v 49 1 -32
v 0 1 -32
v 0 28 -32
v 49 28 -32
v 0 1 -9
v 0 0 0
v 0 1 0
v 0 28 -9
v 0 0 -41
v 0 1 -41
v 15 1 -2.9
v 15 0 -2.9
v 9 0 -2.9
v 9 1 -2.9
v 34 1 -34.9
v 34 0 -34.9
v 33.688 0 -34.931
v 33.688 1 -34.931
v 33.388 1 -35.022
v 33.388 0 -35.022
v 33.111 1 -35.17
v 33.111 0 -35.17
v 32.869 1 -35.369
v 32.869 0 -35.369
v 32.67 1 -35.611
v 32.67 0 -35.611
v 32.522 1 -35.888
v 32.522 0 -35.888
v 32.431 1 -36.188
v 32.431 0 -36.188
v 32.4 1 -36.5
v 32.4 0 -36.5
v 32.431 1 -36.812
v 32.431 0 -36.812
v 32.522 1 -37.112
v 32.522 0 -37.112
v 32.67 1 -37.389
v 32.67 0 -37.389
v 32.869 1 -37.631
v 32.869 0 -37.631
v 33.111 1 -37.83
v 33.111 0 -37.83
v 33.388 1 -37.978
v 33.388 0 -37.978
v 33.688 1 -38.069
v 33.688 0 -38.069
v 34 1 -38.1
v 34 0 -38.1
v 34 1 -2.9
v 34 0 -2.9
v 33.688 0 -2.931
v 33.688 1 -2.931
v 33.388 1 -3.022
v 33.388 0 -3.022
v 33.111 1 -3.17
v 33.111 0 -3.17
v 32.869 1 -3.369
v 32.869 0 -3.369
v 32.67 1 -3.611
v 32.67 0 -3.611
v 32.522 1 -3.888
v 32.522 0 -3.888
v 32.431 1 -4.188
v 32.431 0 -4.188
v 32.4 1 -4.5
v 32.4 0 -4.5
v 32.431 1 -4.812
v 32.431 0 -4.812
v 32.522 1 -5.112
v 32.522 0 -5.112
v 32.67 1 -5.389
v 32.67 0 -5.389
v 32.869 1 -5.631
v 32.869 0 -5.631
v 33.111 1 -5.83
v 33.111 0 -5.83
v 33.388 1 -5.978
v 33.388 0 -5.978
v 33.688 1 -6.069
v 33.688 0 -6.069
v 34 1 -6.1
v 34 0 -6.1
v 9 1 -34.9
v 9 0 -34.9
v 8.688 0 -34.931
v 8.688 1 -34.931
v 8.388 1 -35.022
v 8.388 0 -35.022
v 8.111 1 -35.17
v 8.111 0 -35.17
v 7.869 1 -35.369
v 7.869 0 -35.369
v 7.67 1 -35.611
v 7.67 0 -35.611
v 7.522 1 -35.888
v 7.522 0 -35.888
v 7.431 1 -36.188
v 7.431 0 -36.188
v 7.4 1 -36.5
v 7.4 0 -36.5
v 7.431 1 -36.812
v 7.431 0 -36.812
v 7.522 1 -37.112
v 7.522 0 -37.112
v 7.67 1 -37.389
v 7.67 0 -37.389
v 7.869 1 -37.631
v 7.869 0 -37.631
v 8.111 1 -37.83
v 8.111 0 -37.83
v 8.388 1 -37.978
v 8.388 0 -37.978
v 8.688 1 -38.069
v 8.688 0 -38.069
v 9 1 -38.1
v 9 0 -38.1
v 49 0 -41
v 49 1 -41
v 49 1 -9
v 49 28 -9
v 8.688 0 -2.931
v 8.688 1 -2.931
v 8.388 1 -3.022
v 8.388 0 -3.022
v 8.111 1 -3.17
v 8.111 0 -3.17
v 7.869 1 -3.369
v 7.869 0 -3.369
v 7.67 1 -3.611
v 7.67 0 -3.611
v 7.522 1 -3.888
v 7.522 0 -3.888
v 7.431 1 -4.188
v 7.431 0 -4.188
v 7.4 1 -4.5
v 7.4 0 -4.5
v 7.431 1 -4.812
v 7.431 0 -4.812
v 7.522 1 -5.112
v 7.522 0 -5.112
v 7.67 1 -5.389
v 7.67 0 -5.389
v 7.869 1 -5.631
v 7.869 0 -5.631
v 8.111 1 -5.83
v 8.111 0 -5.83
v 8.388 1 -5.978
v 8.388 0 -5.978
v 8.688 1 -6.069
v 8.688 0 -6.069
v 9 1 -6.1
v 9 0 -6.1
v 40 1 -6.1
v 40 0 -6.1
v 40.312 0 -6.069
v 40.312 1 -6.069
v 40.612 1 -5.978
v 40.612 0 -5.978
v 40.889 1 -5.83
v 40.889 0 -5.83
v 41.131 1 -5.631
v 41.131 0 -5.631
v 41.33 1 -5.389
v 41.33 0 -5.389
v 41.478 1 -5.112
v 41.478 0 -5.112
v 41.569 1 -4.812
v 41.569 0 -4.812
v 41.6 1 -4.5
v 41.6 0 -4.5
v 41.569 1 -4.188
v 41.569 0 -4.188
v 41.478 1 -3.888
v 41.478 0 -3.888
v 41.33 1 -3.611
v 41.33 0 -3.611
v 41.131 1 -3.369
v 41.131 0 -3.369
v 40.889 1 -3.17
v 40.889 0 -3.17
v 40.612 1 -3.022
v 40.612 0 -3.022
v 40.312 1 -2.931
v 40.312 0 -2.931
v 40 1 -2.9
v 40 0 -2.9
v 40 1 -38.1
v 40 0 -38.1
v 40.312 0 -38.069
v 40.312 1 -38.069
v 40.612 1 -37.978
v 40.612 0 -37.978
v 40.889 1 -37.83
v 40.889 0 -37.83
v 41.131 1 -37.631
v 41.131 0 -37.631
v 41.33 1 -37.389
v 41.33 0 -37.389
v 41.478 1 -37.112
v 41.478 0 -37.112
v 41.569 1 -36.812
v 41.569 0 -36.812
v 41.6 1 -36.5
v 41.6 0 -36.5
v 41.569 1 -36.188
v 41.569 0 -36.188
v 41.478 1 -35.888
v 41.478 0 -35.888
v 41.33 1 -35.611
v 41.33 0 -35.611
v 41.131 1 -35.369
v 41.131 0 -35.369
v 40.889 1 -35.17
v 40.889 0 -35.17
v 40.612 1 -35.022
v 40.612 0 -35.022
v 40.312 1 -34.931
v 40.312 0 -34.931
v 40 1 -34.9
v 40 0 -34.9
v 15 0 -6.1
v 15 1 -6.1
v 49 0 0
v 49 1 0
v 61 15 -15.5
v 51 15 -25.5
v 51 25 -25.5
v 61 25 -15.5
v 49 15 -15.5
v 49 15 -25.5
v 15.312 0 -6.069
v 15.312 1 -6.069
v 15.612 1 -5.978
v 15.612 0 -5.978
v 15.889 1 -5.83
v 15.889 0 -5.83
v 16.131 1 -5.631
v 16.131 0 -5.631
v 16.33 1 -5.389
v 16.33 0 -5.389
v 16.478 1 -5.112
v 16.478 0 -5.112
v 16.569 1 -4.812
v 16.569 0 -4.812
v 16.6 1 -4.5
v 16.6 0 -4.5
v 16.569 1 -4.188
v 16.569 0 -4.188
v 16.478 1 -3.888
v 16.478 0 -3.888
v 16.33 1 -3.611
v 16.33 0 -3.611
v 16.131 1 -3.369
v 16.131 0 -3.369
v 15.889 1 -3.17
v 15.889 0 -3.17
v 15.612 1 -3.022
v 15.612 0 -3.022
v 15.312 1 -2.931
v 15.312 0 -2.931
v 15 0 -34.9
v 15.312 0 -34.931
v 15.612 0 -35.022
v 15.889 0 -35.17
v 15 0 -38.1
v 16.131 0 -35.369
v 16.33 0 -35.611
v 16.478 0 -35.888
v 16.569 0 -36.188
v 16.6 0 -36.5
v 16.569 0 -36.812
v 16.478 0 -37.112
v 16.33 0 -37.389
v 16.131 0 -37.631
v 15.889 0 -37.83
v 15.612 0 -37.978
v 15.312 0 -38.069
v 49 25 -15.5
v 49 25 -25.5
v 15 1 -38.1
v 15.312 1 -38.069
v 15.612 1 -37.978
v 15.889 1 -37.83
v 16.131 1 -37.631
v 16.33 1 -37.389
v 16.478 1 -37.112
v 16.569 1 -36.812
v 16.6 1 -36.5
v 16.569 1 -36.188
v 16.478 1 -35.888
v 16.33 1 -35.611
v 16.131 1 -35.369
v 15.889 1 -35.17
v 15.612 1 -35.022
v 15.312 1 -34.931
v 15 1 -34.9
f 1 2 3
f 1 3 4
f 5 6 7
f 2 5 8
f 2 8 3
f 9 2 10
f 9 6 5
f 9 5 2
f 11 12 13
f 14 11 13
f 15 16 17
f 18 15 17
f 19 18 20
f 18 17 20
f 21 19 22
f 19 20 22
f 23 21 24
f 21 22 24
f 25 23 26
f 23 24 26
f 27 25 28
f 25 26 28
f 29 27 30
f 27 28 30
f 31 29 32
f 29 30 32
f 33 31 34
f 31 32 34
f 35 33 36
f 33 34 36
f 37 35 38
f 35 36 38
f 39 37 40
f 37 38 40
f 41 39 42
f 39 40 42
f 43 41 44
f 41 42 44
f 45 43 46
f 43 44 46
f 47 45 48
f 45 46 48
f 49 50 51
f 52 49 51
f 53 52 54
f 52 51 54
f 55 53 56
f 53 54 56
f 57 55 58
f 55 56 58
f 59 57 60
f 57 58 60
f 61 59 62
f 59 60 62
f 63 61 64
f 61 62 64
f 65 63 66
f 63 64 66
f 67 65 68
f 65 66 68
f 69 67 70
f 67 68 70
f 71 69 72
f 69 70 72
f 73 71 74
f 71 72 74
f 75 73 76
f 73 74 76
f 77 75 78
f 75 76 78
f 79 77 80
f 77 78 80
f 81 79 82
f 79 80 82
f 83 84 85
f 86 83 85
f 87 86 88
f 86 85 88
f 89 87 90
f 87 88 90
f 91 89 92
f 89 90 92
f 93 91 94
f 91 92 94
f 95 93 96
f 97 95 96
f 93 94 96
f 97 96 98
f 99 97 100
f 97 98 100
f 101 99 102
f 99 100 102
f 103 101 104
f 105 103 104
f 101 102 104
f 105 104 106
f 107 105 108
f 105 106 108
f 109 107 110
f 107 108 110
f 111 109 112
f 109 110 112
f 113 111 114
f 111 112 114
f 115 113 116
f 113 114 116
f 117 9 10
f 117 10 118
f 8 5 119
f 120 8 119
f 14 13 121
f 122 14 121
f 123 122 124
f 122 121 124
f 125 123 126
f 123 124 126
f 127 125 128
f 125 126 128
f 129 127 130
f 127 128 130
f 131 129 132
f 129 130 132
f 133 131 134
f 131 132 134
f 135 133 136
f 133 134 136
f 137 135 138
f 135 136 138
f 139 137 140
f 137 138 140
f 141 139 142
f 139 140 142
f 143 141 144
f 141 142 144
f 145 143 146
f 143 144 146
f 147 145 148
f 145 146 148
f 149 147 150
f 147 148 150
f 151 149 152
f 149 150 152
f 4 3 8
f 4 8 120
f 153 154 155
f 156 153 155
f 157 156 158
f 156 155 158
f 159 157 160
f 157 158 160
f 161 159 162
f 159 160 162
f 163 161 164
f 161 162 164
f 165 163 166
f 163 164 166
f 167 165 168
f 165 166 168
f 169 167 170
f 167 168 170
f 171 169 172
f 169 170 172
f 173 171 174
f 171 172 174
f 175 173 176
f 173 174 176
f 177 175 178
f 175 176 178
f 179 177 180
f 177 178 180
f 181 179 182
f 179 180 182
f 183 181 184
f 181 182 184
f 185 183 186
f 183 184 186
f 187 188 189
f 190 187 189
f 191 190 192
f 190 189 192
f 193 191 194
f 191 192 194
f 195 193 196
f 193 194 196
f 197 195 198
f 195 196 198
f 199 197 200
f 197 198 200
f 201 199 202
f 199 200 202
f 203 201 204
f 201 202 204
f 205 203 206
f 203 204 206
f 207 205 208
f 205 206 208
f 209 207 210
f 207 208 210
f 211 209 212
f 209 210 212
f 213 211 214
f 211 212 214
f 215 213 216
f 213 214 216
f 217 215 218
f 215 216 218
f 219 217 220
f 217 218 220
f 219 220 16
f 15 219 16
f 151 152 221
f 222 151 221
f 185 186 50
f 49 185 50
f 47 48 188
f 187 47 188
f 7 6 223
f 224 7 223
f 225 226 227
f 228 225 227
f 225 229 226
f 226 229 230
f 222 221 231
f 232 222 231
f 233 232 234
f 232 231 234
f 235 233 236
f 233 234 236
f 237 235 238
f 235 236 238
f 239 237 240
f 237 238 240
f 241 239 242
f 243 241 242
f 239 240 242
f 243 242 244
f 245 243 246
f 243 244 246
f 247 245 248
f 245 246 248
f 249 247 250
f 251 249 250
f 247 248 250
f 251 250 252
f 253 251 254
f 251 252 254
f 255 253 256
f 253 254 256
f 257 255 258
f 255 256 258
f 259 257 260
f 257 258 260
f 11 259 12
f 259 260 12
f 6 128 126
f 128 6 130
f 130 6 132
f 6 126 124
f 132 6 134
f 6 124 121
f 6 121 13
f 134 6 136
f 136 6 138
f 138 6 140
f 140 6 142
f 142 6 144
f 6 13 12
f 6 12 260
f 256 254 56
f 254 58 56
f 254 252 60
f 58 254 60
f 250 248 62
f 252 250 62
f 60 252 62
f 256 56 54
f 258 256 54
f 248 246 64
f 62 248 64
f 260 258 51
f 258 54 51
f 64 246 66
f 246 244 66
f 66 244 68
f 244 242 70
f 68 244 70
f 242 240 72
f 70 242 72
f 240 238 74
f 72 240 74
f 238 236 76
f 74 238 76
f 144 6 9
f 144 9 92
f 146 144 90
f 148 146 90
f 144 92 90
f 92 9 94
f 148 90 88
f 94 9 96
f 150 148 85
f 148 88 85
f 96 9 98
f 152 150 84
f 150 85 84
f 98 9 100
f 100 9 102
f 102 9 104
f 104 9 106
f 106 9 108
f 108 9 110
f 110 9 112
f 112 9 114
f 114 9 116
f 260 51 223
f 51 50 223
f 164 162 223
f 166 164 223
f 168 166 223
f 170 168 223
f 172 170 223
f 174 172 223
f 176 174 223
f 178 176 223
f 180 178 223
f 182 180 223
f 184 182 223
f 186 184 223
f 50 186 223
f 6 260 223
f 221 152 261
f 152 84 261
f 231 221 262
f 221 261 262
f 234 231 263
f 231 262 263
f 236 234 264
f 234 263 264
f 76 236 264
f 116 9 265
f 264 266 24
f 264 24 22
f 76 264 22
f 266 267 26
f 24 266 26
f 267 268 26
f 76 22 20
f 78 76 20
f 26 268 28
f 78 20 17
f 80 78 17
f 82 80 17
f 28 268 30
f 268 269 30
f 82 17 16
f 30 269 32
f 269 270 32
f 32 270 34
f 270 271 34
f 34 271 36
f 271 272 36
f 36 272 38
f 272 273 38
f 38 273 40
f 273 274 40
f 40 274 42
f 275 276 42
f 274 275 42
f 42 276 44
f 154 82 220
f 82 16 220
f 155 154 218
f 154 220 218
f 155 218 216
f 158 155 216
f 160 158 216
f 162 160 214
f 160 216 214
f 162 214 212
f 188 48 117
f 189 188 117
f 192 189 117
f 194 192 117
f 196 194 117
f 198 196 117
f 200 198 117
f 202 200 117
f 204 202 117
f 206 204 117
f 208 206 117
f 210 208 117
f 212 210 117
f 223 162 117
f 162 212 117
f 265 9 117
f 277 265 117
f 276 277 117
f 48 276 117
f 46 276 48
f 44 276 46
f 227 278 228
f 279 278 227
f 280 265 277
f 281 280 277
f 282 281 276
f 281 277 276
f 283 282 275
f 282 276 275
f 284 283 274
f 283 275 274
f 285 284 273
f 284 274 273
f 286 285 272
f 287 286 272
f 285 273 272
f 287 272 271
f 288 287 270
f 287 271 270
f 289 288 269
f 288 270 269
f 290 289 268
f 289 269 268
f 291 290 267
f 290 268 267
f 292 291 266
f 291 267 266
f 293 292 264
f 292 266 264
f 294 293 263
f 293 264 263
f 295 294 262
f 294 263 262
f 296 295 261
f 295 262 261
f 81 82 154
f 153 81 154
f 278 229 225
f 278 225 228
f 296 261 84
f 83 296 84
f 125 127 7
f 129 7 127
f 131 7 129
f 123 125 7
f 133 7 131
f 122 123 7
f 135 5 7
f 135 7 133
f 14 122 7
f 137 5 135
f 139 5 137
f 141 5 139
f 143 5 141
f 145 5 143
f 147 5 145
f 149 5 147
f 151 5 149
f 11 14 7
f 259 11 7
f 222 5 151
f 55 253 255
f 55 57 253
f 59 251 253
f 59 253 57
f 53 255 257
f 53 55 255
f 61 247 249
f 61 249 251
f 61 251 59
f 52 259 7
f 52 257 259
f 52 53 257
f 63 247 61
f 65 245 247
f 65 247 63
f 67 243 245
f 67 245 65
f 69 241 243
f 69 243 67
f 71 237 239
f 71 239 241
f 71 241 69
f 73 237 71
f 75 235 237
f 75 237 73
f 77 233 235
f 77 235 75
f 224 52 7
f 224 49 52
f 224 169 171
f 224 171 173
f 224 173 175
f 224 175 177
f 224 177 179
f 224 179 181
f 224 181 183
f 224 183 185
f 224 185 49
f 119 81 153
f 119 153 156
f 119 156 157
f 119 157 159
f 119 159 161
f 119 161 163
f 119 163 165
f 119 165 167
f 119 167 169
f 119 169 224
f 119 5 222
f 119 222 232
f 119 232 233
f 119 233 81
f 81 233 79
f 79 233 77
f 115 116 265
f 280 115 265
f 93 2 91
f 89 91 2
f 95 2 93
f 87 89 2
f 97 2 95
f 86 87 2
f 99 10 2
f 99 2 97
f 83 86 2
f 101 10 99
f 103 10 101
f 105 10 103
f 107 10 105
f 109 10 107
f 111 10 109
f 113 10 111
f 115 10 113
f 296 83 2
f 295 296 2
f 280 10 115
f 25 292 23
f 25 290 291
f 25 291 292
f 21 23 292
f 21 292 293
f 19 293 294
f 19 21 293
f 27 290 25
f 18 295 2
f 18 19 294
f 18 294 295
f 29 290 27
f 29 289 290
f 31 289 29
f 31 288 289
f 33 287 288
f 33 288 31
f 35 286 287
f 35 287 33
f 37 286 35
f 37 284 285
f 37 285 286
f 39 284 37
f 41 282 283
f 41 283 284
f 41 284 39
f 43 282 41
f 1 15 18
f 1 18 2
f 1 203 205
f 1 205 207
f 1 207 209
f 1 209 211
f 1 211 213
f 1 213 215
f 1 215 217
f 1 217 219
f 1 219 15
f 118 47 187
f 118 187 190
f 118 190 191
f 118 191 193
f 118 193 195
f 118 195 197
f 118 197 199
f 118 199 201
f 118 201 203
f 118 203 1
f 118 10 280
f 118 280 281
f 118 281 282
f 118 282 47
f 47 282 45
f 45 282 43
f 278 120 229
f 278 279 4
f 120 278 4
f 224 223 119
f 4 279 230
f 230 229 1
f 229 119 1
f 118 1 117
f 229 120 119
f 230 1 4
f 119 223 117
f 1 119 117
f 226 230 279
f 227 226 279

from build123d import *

# Parameters (mm, degrees)
SKETCH1_W           = 49
SKETCH1_H           = 41
BOSS_EXTRUDE1_DEPTH = 1
SKETCH2_W           = 49
SKETCH2_H           = 23
BOSS_EXTRUDE2_DEPTH = 27
SKETCH3_W           = 10
SKETCH3_H           = 10
BOSS_EXTRUDE3_DEPTH = 12
CHAMFER1_SIZE       = 10


with BuildPart() as part:
    # Sketch1 → Boss-Extrude1 (new body)
    with BuildSketch(Plane(origin=(0, 0, 0), x_dir=(1, 0, 0), z_dir=(0, 1, 0))):
        with Locations((24.5, 20.5)):
            Rectangle(SKETCH1_W, SKETCH1_H)
        with BuildLine():
            Line((9, 38.1), (15, 38.1))
            ThreePointArc((15, 38.1), (16.6, 36.5), (15, 34.9))
            Line((15, 34.9), (9, 34.9))
            ThreePointArc((9, 34.9), (7.4, 36.5), (9, 38.1))
        make_face(mode=Mode.SUBTRACT)
        with BuildLine():
            Line((34, 38.1), (40, 38.1))
            ThreePointArc((40, 38.1), (41.6, 36.5), (40, 34.9))
            Line((40, 34.9), (34, 34.9))
            ThreePointArc((34, 34.9), (32.4, 36.5), (34, 38.1))
        make_face(mode=Mode.SUBTRACT)
        with BuildLine():
            Line((34, 6.1), (40, 6.1))
            ThreePointArc((40, 6.1), (41.6, 4.5), (40, 2.9))
            Line((40, 2.9), (34, 2.9))
            ThreePointArc((34, 2.9), (32.4, 4.5), (34, 6.1))
        make_face(mode=Mode.SUBTRACT)
        with BuildLine():
            Line((15, 2.9), (9, 2.9))
            ThreePointArc((9, 2.9), (7.4, 4.5), (9, 6.1))
            Line((9, 6.1), (15, 6.1))
            ThreePointArc((15, 6.1), (16.6, 4.5), (15, 2.9))
        make_face(mode=Mode.SUBTRACT)
    extrude(amount=BOSS_EXTRUDE1_DEPTH)

    # Sketch2 → Boss-Extrude2 (add)
    with BuildSketch(Plane(origin=(0, 1, 0), x_dir=(1, 0, 0), z_dir=(0, 1, 0))):
        with Locations((24.5, 20.5)):
            Rectangle(SKETCH2_W, SKETCH2_H)
    extrude(amount=BOSS_EXTRUDE2_DEPTH)

    # Sketch3 → Boss-Extrude3 (add)
    with BuildSketch(Plane(origin=(49, 0, 0), x_dir=(0, 0, -1), z_dir=(1, 0, 0))):
        with Locations((20.5, 20)):
            Rectangle(SKETCH3_W, SKETCH3_H)
    extrude(amount=BOSS_EXTRUDE3_DEPTH)

    # Chamfer1
    chamfer1_edges = [part.edges().sort_by_distance(p)[0] for p in [
        (61, 20, -25.5),
    ]]
    chamfer(chamfer1_edges, length=CHAMFER1_SIZE - 0.0001)  # a hair under: the kernel refuses the full size


solid = part.part
